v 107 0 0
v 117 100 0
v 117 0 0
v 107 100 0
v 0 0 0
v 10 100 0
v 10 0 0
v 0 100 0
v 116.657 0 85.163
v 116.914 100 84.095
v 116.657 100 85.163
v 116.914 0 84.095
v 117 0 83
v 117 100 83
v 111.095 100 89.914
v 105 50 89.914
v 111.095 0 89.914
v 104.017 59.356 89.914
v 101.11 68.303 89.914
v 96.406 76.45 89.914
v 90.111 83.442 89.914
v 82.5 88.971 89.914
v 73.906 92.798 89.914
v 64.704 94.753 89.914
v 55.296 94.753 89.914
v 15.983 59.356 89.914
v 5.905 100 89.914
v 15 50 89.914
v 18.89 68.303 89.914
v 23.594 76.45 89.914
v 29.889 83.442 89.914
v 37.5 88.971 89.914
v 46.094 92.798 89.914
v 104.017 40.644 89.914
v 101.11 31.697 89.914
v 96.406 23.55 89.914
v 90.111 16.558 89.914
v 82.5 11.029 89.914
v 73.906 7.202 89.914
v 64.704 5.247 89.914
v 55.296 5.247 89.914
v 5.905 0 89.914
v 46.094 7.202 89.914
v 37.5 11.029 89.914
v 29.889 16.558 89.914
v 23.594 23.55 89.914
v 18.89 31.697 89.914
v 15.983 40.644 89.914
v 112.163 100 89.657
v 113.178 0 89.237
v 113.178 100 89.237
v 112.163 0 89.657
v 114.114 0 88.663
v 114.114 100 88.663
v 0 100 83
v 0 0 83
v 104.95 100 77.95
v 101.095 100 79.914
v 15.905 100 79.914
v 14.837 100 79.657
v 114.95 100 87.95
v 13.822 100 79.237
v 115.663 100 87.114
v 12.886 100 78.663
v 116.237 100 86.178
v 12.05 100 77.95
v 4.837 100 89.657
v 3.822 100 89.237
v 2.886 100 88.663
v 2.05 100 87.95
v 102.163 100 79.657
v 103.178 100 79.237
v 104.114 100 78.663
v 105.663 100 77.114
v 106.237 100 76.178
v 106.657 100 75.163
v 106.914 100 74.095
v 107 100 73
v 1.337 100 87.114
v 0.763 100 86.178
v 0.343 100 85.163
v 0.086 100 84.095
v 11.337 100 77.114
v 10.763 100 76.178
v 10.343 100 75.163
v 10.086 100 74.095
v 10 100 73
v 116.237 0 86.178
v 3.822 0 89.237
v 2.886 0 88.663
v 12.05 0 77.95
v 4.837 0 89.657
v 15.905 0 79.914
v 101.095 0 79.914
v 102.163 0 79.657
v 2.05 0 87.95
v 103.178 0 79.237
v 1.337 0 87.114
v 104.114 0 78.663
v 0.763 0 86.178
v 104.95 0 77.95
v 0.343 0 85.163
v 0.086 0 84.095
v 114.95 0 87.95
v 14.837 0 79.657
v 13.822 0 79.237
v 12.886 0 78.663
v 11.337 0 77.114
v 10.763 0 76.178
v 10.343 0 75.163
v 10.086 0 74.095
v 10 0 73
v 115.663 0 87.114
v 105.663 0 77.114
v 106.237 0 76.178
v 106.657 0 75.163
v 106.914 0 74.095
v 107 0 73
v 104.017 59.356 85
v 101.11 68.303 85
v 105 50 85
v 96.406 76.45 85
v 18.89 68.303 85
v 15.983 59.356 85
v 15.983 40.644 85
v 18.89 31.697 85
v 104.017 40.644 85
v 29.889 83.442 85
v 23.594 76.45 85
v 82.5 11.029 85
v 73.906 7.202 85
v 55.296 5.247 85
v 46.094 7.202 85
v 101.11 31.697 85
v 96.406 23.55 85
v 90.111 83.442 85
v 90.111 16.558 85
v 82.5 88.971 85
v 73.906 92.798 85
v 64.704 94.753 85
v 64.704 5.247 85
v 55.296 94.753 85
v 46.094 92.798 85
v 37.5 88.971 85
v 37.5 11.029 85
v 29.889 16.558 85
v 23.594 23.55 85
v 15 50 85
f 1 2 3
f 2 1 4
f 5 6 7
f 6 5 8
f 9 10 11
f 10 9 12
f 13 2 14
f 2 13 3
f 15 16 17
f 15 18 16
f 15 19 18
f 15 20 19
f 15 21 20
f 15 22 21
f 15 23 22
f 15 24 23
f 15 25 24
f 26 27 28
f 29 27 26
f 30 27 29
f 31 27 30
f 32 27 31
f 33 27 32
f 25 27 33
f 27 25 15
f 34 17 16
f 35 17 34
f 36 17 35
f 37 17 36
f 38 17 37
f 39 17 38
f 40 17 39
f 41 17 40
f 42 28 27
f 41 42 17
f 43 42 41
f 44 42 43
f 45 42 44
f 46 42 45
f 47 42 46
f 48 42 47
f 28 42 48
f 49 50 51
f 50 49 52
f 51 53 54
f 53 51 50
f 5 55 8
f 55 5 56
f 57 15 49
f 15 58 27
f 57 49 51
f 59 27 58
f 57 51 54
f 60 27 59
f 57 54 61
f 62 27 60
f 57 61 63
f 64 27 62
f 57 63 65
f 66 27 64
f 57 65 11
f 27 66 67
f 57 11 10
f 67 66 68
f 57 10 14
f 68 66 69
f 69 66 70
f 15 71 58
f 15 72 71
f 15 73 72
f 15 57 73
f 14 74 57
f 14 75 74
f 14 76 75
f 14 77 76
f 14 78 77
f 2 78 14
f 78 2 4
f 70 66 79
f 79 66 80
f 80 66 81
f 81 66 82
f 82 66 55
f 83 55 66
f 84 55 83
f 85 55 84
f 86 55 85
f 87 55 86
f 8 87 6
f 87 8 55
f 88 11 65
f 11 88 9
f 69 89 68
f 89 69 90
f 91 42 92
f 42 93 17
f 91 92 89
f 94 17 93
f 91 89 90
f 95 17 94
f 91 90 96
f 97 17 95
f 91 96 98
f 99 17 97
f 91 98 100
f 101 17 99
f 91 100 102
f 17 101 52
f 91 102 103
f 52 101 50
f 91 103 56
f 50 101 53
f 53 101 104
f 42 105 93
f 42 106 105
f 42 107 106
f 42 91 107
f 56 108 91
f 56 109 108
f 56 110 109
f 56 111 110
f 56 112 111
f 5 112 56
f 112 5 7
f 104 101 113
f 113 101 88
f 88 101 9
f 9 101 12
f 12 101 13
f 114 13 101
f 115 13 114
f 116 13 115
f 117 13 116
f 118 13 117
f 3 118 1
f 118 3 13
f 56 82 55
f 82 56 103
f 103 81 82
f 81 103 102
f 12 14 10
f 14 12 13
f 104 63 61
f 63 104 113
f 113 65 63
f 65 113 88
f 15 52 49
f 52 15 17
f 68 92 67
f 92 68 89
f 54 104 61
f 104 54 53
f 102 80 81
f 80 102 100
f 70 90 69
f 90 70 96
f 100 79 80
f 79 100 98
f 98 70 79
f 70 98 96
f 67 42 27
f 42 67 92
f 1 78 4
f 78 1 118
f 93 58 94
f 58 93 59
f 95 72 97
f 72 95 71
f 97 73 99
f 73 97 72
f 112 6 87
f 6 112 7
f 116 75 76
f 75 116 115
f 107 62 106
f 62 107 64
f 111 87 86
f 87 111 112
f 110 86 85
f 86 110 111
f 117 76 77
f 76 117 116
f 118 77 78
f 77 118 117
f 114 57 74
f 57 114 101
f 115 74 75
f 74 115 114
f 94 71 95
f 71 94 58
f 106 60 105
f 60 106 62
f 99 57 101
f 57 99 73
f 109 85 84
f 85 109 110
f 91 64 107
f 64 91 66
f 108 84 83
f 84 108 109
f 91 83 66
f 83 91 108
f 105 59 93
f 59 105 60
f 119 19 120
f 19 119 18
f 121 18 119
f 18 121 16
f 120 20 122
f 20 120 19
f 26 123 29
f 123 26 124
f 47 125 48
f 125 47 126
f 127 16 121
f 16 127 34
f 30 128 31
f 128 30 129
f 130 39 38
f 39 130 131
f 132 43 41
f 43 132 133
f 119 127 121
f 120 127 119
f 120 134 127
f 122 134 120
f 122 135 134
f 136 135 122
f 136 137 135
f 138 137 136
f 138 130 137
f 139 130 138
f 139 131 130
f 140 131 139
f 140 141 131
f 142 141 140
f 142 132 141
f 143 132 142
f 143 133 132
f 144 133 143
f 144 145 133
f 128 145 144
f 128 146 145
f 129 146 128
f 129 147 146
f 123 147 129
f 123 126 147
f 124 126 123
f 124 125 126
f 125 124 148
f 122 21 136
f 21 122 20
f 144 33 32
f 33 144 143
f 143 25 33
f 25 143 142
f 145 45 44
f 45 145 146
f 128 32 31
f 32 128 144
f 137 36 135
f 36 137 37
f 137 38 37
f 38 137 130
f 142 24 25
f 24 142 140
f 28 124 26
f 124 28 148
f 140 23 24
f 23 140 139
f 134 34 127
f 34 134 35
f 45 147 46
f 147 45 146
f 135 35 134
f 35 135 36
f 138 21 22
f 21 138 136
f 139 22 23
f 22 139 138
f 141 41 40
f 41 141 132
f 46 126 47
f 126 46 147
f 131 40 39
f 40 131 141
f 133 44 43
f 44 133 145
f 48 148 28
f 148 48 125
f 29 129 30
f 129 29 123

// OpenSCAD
// [FL_INDEX: keywords="openscad, 3d_parametric, parameterized_cup_holder, csg_solid" | COT="Parametric OpenSCAD design from 3DCodeverse"]
// Title: parameterized cup holder 

chairArmWidth=130;
cupHolderLength=100;
cupHolderHeight=90;
widthOfCupHolder=10;
curveRadius=7;
smoothingAmount=10;
diameterOfCup=90;
module cupHolderBase(){
difference(){
hull(){
for(i=[1:smoothingAmount]){
translate([curveRadius-curveRadius*sin(i*90/smoothingAmount),0,0])cube([(cupHolderHeight+2*widthOfCupHolder-curveRadius+2*curveRadius*sin(i*90/smoothingAmount)),cupHolderLength,(cupHolderHeight-curveRadius+curveRadius*cos(i*90/smoothingAmount))]);
}
}
hull(){
for(i=[1:smoothingAmount]){
translate([widthOfCupHolder+curveRadius-curveRadius*sin(i*90/smoothingAmount),-10,-10])cube([(cupHolderHeight-curveRadius+2*curveRadius*sin(i*90/smoothingAmount)),cupHolderLength+20,(cupHolderHeight-widthOfCupHolder-curveRadius+10+curveRadius*cos(i*90/smoothingAmount))]);
}
}
}
}
difference(){
cupHolderBase();

translate([(chairArmWidth-widthOfCupHolder)/2,cupHolderLength/2,cupHolderHeight-widthOfCupHolder/2])cylinder(r=diameterOfCup/2,h=smoothingAmount/2);
}
